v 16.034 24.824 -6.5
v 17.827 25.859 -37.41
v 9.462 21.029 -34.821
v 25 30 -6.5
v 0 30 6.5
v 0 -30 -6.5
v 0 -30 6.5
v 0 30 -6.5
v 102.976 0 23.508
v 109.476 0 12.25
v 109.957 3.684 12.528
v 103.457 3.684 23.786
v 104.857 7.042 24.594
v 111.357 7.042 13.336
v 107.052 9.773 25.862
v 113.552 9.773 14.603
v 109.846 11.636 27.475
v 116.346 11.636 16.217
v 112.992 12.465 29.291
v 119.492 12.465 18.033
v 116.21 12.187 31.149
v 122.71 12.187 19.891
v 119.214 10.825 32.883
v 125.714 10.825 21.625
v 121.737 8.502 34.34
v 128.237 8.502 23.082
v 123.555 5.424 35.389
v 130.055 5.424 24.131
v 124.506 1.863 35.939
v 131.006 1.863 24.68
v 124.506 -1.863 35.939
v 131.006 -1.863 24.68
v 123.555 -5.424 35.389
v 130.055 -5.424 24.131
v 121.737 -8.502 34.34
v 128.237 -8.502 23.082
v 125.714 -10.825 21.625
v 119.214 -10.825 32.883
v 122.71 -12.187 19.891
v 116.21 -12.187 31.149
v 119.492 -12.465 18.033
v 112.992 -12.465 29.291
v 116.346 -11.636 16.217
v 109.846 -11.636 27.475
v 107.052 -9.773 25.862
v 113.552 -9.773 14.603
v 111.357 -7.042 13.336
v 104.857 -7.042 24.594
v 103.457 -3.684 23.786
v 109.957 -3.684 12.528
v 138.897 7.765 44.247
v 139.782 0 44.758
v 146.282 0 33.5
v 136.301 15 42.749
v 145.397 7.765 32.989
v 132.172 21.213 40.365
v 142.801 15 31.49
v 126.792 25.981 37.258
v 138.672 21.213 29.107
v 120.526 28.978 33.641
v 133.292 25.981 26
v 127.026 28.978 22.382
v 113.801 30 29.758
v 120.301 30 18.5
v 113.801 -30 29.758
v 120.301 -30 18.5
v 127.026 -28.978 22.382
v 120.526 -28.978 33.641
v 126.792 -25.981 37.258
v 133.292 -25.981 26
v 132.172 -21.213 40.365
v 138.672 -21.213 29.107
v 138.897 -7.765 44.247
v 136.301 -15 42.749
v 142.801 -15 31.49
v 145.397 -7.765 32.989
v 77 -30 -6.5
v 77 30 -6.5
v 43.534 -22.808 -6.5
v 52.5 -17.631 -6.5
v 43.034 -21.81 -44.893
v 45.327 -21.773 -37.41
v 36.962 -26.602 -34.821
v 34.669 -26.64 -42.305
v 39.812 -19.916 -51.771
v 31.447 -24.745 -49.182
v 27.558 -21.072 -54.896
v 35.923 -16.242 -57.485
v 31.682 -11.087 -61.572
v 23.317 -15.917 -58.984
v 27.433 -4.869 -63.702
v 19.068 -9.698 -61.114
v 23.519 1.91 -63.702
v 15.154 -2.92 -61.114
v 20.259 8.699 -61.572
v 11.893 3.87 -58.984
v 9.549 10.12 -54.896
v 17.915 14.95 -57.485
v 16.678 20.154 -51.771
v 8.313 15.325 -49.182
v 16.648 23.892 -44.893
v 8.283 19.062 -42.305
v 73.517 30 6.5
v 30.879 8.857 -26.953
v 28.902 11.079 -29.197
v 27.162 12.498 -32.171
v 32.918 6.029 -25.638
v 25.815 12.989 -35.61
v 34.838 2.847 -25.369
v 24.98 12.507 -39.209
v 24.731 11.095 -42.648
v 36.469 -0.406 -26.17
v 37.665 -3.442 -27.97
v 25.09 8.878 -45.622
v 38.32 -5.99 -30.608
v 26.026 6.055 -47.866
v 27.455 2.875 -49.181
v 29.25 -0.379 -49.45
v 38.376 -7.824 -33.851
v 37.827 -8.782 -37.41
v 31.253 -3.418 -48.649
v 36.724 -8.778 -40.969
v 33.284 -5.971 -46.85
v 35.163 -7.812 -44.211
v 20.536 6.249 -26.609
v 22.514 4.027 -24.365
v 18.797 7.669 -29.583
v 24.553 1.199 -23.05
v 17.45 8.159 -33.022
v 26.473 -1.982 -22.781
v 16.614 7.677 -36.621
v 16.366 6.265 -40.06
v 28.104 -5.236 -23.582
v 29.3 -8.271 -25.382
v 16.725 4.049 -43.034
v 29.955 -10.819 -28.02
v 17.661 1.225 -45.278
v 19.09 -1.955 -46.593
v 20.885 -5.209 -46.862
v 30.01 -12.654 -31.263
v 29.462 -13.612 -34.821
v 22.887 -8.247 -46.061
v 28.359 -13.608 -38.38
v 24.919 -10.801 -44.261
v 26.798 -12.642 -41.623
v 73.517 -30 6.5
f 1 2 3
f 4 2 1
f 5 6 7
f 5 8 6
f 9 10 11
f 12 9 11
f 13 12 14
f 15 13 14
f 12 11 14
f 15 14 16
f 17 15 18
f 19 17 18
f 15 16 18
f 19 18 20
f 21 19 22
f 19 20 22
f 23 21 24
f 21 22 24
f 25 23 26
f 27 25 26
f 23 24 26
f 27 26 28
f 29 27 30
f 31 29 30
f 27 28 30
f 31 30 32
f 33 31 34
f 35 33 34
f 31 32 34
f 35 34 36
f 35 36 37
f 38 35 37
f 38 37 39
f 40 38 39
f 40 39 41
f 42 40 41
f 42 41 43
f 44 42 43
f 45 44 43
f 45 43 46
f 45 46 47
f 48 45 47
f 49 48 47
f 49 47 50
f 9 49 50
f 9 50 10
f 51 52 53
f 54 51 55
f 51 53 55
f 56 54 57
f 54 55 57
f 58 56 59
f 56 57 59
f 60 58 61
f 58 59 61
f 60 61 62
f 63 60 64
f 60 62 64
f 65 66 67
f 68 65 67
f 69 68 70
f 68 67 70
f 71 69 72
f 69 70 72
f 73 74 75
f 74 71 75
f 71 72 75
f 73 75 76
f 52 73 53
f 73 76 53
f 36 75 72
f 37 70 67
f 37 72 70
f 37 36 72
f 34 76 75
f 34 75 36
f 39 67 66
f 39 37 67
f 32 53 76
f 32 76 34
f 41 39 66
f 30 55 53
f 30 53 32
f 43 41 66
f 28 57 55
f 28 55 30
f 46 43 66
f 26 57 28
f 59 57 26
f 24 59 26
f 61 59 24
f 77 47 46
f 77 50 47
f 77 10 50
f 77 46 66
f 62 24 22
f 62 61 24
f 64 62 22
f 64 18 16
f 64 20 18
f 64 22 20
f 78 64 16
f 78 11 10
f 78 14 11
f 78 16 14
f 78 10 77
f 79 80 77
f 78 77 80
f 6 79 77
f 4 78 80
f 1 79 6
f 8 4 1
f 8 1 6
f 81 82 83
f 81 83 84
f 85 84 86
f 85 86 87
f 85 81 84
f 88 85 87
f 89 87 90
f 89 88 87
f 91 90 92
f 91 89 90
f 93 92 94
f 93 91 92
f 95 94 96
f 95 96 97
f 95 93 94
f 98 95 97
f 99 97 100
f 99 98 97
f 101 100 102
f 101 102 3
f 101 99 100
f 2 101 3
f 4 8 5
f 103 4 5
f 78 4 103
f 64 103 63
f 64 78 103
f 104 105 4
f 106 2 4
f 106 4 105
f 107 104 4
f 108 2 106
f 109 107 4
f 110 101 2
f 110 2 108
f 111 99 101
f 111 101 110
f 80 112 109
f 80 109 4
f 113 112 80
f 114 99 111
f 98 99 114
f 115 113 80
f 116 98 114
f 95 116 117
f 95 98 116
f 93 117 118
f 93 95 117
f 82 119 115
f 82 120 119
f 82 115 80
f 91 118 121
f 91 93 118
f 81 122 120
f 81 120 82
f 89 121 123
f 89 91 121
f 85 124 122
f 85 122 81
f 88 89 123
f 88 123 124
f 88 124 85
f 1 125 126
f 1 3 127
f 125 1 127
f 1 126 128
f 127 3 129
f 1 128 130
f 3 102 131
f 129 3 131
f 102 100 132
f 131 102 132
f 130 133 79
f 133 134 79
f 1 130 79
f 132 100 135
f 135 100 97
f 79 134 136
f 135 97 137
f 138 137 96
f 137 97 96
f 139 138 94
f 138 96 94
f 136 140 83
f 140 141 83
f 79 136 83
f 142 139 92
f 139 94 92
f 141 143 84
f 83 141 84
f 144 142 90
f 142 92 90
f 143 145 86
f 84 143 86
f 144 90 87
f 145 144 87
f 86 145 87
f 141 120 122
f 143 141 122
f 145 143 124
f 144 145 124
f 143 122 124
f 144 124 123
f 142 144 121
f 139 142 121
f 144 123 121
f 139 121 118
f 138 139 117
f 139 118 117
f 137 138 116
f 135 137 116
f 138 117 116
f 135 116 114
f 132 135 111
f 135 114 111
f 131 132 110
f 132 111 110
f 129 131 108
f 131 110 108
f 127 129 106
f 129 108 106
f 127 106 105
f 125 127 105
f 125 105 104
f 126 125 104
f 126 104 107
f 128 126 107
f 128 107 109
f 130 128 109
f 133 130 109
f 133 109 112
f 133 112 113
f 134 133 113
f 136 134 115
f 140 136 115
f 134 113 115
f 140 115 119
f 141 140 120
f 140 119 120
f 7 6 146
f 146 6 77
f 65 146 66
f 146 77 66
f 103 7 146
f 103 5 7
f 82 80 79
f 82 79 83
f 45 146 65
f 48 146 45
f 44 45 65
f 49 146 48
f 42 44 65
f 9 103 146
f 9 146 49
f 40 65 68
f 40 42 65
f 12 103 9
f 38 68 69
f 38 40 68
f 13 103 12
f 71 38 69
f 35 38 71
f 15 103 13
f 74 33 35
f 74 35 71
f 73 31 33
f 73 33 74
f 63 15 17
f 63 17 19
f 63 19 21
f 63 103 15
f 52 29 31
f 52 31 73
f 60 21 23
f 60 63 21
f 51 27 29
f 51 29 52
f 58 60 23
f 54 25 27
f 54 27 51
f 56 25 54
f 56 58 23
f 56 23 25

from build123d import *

# Parameters (mm, degrees)
BOSS_EXTRUDE1_DEPTH = 30
SKETCH2_R           = 12.5
CUT_EXTRUDE1_DEPTH  = 60
SKETCH4_R           = 12.5
BOSS_EXTRUDE2_DEPTH = 10


with BuildPart() as part:
    # Sketch1 → Boss-Extrude1 (new body, symmetric)
    with BuildSketch(Plane(origin=(0, 0, 0), x_dir=(1, 0, 0), z_dir=(0, 1, 0))):
        Polygon((0, -6.5), (73.516660498, -6.5), (139.782032303, -44.758330249), (146.282032303, -33.5), (77, 6.5), (0, 6.5), align=None)
    extrude(amount=BOSS_EXTRUDE1_DEPTH, both=True)

    # Sketch2 → Cut-Extrude1 (cut)
    with BuildSketch(Plane(origin=(22.064582562, 0, -38.216978046), x_dir=(-0.866025404, 0, -0.5), z_dir=(0.5, 0, -0.866025404))):
        with Locations((-113.433956091, 0)):
            Circle(SKETCH2_R)
        with BuildLine():
            Line((-143.433956091, 30), (-143.433956091, 2.09e-07))
            ThreePointArc((-143.433956091, 2.09e-07), (-134.647159453, 21.21320351), (-113.433956091, 30))
            Line((-113.433956091, 30), (-143.433956091, 30))
        make_face()
        with BuildLine():
            Line((-143.433956091, 2.09e-07), (-143.433956091, -30))
            Line((-143.433956091, -30), (-113.433956091, -30))
            ThreePointArc((-113.433956091, -30), (-134.647159601, -21.213203362), (-143.433956091, 2.09e-07))
        make_face()
    extrude(amount=-CUT_EXTRUDE1_DEPTH, mode=Mode.SUBTRACT)

    # Sketch4 → Boss-Extrude2 (add)
    with BuildSketch(Plane(origin=(31.02146997, 17.910254038, -9.598076211), x_dir=(0.5, -0.866025404, 0), z_dir=(0.836516304, 0.482962913, -0.258819045))):
        with BuildLine():
            Line((-13.480762114, -3.207364507), (41.519237886, -3.207364507))
            Line((41.519237886, -3.207364507), (41.519237886, 28.792635493))
            ThreePointArc((41.519237886, 28.792635493), (14.019237886, 56.292635493), (-13.480762114, 28.792635493))
            Line((-13.480762114, 28.792635493), (-13.480762114, -3.207364507))
        make_face()
        with Locations((14.019237886, 28.792635493)):
            Circle(SKETCH4_R, mode=Mode.SUBTRACT)
    extrude(amount=-BOSS_EXTRUDE2_DEPTH)


solid = part.part
